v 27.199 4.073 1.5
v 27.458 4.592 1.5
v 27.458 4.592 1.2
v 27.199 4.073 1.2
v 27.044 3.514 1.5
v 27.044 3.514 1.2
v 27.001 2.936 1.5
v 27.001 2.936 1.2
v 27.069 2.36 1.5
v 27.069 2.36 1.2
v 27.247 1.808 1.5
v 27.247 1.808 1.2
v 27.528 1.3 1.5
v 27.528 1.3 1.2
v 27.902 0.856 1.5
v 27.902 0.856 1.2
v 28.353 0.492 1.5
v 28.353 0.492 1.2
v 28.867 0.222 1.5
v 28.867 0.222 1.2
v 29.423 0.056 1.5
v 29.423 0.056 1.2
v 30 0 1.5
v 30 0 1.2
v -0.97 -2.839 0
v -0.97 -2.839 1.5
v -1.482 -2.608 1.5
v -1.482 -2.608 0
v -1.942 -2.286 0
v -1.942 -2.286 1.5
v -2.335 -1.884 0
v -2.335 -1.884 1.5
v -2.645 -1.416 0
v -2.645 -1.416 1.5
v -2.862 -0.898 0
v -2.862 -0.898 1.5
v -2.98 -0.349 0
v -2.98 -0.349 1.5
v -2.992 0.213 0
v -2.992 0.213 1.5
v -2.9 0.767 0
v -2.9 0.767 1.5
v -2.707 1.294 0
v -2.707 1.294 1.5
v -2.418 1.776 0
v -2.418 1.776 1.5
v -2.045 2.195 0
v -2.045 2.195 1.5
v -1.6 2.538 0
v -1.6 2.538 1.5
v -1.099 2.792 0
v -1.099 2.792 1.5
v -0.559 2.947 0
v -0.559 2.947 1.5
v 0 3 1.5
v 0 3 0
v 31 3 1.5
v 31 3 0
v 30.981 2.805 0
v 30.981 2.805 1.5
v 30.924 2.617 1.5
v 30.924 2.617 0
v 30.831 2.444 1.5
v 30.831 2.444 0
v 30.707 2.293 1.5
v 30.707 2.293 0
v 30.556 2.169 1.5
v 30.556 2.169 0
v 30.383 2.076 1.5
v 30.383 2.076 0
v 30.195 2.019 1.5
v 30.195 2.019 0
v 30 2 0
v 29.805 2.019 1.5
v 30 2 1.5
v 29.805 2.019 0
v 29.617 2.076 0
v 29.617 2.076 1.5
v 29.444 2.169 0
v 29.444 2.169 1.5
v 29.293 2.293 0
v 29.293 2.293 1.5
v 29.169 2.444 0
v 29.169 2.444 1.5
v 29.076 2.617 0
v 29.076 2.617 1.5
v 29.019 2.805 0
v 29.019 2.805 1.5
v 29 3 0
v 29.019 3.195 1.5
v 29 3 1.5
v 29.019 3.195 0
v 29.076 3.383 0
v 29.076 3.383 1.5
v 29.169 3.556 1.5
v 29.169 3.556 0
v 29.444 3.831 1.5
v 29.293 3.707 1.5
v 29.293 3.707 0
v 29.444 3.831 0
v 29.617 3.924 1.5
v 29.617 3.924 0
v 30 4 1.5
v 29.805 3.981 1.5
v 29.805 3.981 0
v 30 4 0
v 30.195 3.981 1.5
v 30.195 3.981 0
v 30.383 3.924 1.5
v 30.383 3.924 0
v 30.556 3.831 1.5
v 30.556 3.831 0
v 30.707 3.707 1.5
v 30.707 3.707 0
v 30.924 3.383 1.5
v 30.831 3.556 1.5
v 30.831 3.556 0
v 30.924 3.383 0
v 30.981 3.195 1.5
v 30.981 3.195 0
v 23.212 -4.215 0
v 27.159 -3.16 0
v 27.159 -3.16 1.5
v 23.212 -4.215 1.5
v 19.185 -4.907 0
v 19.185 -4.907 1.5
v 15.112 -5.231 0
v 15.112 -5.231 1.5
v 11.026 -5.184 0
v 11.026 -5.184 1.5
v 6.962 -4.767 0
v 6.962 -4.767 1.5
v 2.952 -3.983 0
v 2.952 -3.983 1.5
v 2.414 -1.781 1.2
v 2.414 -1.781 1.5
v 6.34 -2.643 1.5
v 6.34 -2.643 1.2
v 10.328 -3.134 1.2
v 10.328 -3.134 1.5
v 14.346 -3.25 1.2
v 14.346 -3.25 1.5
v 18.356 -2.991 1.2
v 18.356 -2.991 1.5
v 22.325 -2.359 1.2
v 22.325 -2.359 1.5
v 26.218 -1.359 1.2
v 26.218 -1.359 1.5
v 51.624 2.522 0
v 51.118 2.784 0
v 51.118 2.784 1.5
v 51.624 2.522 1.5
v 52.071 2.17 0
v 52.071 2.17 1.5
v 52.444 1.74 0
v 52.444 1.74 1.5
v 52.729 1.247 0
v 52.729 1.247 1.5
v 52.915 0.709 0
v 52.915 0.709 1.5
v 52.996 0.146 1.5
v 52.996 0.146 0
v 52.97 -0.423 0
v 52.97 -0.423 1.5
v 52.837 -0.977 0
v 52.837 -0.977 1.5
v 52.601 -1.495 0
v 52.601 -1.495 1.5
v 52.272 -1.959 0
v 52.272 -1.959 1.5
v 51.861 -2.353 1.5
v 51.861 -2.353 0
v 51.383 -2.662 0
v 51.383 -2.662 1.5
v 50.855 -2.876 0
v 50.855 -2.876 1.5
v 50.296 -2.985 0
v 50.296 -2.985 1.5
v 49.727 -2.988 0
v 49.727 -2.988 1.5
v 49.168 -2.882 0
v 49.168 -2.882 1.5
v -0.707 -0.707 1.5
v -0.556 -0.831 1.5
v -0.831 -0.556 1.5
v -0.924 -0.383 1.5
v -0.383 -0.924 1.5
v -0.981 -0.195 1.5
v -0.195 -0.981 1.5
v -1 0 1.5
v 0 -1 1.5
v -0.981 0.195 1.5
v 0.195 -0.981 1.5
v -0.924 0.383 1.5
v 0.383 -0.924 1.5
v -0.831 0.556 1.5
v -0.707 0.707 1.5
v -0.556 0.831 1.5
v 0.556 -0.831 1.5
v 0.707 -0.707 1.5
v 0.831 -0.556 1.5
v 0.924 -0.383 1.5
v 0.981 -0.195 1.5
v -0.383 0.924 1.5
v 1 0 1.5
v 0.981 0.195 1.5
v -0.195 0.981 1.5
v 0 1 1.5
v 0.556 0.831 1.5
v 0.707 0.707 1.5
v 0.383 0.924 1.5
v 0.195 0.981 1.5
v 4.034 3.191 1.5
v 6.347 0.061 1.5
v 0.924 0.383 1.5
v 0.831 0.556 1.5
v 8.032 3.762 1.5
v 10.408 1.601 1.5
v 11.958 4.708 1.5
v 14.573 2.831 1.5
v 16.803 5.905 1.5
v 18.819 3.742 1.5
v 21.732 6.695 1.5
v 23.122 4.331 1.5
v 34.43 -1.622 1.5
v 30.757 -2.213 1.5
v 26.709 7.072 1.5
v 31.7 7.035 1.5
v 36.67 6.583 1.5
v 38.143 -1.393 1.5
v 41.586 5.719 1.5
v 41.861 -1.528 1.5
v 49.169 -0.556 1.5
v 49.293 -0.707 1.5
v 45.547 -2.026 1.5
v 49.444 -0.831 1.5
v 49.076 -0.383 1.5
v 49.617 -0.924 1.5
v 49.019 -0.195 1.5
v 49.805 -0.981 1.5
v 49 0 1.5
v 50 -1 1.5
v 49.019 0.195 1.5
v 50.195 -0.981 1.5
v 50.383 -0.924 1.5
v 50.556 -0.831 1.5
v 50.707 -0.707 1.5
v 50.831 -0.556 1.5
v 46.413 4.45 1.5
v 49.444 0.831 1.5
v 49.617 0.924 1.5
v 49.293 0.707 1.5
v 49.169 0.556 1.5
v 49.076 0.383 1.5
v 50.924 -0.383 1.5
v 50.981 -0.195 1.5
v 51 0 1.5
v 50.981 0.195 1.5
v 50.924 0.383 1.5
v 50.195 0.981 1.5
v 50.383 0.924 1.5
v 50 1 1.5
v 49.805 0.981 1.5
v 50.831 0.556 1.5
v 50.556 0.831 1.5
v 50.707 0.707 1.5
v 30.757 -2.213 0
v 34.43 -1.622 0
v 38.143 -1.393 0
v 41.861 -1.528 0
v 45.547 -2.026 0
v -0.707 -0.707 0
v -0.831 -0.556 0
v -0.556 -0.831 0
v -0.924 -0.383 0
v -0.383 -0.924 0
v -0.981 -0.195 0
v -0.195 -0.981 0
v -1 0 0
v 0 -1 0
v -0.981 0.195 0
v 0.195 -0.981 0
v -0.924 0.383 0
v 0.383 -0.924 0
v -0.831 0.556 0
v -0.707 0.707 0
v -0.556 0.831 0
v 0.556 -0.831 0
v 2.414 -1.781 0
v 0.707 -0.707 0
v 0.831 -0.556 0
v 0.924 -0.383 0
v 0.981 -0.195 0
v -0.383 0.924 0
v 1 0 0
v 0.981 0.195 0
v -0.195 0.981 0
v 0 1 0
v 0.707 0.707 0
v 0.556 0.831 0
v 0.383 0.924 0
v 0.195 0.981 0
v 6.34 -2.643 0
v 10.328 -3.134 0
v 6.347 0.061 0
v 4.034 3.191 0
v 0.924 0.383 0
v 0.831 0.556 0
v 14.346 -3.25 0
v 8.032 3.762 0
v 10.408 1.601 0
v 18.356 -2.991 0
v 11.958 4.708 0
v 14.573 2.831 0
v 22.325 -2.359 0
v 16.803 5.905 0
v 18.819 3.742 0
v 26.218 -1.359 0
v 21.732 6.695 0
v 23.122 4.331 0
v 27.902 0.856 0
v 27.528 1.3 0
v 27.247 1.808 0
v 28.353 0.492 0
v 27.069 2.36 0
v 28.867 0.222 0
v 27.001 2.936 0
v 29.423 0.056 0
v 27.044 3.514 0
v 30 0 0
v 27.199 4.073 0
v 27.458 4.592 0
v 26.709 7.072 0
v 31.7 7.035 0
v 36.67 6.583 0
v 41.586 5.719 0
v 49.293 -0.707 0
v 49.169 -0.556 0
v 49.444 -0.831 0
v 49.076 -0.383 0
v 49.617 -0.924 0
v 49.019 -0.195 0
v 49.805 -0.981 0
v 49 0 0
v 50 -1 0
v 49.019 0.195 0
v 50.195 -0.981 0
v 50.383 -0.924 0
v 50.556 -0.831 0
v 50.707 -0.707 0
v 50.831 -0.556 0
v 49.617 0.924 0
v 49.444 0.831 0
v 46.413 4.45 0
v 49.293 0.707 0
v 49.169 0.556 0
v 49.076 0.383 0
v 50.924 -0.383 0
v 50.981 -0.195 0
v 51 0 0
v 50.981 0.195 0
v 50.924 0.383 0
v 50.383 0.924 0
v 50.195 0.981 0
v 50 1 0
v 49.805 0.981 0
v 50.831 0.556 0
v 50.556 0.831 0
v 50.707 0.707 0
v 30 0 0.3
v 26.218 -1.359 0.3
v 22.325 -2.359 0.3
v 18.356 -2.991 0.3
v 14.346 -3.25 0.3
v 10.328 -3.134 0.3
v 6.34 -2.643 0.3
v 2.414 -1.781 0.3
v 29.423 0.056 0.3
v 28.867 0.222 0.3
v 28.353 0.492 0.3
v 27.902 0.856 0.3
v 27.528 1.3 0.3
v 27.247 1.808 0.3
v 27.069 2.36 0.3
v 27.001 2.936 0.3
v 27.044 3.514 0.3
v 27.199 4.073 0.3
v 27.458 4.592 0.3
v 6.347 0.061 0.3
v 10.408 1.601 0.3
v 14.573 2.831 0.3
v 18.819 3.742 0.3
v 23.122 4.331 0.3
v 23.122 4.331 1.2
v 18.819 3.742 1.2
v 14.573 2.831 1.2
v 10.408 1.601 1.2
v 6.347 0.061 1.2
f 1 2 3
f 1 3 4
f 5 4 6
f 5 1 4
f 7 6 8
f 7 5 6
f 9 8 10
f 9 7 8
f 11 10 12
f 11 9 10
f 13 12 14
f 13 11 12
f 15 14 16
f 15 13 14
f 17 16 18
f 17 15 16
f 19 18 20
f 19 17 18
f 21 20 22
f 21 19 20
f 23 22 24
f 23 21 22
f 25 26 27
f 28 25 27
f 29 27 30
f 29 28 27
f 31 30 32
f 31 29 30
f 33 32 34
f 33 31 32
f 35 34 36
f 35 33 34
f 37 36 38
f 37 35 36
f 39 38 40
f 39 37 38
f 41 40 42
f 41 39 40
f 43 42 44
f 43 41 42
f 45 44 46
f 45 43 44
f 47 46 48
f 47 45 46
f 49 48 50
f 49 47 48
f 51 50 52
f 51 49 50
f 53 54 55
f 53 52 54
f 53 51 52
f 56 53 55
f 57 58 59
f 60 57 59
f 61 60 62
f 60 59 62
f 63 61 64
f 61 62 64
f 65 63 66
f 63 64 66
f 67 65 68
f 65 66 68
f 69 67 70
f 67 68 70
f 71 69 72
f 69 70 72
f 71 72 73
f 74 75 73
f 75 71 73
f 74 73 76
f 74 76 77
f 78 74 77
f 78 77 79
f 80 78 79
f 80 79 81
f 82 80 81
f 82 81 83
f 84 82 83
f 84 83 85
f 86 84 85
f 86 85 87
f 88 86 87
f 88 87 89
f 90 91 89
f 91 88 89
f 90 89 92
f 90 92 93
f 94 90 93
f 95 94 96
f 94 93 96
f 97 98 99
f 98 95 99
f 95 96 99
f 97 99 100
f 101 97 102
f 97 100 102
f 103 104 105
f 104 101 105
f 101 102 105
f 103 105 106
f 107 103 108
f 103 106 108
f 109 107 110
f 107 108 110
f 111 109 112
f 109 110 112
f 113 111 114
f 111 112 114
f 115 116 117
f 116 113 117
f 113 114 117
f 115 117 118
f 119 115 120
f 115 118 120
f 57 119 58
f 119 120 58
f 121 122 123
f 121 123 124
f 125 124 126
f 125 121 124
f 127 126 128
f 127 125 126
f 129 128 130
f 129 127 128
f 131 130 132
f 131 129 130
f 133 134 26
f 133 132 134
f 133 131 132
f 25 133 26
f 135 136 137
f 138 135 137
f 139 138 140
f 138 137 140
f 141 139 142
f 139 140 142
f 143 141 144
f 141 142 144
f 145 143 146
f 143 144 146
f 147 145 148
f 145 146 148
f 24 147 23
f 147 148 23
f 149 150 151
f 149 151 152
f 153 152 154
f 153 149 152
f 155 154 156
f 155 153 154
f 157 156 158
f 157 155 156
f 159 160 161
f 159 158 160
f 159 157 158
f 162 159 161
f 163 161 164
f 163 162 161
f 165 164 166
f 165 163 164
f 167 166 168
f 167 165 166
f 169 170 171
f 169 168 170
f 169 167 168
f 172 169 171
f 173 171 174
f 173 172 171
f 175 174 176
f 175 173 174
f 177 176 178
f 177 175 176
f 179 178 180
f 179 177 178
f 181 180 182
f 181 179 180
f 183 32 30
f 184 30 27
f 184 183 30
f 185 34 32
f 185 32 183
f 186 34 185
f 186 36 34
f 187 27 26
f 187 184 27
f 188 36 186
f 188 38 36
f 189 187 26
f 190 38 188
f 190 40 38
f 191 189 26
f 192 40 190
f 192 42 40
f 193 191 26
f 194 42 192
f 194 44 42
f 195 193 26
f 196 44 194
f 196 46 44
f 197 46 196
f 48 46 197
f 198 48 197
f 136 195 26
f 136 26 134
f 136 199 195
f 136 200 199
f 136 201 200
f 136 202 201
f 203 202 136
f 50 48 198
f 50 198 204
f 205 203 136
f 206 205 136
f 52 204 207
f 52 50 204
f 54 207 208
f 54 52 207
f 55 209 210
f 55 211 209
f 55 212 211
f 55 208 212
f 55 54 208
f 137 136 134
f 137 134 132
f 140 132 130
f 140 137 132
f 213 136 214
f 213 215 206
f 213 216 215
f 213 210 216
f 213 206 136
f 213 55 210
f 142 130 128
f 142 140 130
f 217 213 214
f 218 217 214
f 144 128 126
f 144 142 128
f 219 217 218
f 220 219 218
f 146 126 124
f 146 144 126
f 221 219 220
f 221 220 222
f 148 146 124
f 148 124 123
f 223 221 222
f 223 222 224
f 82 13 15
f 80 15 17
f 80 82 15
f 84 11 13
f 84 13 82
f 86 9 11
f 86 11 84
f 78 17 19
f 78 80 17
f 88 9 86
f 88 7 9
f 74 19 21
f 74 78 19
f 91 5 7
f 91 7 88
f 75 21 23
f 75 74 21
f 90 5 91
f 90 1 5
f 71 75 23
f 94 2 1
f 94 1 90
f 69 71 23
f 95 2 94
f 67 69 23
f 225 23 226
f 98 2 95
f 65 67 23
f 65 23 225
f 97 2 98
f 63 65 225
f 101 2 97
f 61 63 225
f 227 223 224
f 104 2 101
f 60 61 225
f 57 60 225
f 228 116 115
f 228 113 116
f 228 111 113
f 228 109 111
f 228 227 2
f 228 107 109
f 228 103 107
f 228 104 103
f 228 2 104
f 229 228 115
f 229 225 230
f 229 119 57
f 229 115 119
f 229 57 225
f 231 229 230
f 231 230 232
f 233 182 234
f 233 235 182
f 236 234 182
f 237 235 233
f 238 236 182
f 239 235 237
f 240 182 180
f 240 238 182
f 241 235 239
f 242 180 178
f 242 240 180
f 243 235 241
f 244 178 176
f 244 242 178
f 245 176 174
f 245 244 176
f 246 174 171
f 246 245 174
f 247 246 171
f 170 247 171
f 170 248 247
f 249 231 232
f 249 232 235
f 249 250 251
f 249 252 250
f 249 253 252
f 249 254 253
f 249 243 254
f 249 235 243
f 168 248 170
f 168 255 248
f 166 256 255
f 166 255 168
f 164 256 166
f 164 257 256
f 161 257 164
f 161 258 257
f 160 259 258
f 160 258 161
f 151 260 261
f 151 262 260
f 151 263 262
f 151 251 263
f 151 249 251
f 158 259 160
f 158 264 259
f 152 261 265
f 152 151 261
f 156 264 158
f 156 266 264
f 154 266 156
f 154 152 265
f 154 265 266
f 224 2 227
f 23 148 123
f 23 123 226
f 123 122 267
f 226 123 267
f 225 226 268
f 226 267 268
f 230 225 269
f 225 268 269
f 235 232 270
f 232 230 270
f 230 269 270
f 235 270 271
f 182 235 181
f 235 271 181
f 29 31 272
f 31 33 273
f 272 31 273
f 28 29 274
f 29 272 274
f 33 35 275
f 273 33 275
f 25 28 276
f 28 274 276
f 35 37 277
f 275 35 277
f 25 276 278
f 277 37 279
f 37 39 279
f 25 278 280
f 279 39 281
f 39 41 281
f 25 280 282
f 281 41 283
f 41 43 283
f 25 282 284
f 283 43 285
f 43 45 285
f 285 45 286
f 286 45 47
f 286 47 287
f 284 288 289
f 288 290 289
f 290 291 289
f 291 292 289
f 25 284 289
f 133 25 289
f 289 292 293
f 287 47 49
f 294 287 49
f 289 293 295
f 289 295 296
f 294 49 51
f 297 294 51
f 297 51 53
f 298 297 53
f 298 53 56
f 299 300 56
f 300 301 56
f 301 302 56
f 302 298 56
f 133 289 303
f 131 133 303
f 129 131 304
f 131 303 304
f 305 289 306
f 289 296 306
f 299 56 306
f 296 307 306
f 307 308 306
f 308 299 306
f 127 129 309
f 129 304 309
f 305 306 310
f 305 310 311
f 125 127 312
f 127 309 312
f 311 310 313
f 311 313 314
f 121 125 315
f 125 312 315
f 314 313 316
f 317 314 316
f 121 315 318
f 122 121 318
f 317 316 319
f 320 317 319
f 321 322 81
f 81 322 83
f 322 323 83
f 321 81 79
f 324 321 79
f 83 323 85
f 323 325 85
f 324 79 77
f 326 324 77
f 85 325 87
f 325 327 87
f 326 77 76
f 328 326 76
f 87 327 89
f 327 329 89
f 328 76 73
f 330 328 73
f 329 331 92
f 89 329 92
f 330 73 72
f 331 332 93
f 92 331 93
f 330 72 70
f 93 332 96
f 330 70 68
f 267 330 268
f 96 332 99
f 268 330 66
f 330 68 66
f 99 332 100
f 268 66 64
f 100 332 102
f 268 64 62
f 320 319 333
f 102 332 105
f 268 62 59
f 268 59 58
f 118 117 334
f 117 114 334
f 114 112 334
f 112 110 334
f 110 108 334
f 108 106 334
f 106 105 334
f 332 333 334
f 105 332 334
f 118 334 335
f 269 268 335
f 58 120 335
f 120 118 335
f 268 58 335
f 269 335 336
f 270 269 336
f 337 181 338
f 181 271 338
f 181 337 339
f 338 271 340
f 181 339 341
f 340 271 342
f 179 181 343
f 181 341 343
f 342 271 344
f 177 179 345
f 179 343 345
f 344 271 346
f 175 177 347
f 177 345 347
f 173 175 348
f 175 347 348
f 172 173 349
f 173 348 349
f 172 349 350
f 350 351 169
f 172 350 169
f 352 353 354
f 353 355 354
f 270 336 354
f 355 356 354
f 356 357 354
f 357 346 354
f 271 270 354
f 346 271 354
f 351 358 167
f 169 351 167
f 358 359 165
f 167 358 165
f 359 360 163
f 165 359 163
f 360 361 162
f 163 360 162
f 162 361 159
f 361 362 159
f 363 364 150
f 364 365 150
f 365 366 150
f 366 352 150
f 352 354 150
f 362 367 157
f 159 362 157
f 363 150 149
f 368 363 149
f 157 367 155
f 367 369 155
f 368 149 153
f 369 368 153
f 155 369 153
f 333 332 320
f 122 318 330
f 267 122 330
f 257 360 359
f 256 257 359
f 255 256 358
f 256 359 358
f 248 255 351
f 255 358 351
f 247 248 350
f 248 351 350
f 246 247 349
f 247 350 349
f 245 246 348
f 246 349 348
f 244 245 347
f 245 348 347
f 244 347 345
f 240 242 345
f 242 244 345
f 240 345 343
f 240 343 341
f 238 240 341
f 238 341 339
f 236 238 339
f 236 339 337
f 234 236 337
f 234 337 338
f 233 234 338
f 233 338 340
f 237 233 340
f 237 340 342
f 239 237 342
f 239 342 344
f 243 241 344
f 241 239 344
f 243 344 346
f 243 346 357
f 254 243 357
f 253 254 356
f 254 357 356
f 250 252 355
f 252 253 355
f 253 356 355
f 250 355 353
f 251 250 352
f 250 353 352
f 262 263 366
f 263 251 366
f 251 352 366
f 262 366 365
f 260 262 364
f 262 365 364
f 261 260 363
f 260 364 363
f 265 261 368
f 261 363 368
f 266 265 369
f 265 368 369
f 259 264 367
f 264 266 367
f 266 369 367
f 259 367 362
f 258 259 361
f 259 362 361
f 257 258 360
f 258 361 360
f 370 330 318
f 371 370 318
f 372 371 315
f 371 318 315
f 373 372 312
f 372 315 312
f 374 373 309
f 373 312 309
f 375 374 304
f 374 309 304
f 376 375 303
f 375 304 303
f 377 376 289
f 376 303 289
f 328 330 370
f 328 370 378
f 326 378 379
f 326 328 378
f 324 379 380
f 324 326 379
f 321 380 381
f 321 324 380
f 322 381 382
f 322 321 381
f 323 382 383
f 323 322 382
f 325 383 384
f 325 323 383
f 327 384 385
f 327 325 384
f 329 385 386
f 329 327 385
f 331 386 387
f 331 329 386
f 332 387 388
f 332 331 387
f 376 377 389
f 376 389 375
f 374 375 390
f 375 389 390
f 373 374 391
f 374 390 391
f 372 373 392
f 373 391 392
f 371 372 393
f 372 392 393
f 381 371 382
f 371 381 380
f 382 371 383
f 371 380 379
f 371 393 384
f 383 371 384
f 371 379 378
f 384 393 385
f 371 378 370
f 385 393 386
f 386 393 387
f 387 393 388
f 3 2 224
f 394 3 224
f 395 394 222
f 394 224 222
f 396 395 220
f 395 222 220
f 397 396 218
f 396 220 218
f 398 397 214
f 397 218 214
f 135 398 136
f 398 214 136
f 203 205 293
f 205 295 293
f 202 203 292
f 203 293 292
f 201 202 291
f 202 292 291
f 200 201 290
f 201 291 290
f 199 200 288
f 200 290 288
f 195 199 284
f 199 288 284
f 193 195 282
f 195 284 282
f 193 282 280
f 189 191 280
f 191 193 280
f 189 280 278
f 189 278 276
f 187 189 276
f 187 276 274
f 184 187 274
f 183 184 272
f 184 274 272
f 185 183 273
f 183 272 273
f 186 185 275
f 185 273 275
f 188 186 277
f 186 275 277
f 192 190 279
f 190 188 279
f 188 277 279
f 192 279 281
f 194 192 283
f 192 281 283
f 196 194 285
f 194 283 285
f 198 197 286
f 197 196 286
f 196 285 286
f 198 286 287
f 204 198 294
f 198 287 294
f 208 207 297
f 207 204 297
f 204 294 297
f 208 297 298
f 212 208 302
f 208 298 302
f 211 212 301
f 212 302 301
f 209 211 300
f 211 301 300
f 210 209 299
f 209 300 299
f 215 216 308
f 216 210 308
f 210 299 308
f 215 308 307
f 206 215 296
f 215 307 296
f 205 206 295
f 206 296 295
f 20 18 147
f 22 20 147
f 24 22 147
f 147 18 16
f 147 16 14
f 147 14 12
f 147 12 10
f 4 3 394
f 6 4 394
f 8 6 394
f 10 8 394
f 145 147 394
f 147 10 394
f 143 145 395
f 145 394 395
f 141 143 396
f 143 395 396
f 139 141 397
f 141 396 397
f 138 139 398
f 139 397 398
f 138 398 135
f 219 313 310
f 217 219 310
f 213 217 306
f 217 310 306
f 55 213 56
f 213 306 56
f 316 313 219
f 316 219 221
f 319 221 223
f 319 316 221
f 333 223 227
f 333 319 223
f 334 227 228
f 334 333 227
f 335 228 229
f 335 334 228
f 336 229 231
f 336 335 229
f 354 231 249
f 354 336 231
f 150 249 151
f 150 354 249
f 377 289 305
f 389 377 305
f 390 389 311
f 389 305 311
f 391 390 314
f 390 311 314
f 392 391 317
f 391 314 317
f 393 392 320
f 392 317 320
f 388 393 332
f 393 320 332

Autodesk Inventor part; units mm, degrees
ref_plane "YZ Plane" through (0, 0, 0) normal (1, 0, 0) x (0, 1, 0)
ref_plane "XZ Plane" through (0, 0, 0) normal (0, 1, 0) x (-1, 0, 0)
sketch "Sketch1" plane through (0, 0, 0) normal (0, 0, 1) x (1, 0, 0)
  circle A0 centre (0, 0) radius 1
  circle A1 centre (50, 0) radius 1
  circle A2 centre (30, 3) radius 1
  circle A3 centre (0, 0) radius 3 construction
  circle A4 centre (50, 0) radius 3 construction
  circle A5 centre (30, 3) radius 3 construction
  arc A6 (0, 3) -> (-0.9702, -2.8388) centre (0, 0) ccw
  arc A7 (-0.9702, -2.8388) -> (27.1592, -3.1605) centre (13.5833, 39.7428) ccw
  arc A8 (51.1182, 2.7838) -> (11.9578, 4.708) centre (28.755, -52.8928) ccw
  arc A9 (0, 3) -> (11.9578, 4.708) centre (0, 45.7132) ccw
  arc A10 (49.1676, -2.8822) -> (27.1592, -3.1605) centre (38.6233, -39.39) ccw
  arc A11 (49.1676, -2.8822) -> (51.1182, 2.7838) centre (50, 0) ccw
  arc A12 (27.4576, 4.5925) -> (2.414, -1.7812) centre (28.755, -52.8928) ccw
  arc A13 (2.414, -1.7812) -> (30, 0) centre (13.5833, 39.7428) ccw
  arc A14 (27.4576, 4.5925) -> (30, 0) centre (30, 3) ccw
  dimension "d6" = 6
  dimension "d0" = 2
  dimension "d1" = 2
  dimension "d2" = 2
  dimension "d3" = 50
  dimension "d4" = 3
  dimension "d5" = 30
  dimension "d7" = 6
  dimension "d8" = 6
  dimension "d35" = 3
  dimension "d58" = 3
  dimension "d63" = 2
  dimension "d64" = 2.5
  dimension "d65" = 45
  dimension "d66" = 38
  dimension "d67" = 60
extrude "Extrusion2" add sketch "Sketch1" along normal blind 1.5 contours A9 A8 A11 A10 A7 A6 | A14 A13 A12
extrude "Extrusion3" cut sketch "Sketch1" along normal blind 0.3 contours A14 A13 A12
ref_plane "Work Plane1" through (0, 0, 0.75) normal (0, 0, 1) x (1, 0, 0)
mirror "Mirror1" about plane through (0, 0, 0.75) normal (0, 0, 1) of "Extrusion3"
properties part number "legB_mini"
